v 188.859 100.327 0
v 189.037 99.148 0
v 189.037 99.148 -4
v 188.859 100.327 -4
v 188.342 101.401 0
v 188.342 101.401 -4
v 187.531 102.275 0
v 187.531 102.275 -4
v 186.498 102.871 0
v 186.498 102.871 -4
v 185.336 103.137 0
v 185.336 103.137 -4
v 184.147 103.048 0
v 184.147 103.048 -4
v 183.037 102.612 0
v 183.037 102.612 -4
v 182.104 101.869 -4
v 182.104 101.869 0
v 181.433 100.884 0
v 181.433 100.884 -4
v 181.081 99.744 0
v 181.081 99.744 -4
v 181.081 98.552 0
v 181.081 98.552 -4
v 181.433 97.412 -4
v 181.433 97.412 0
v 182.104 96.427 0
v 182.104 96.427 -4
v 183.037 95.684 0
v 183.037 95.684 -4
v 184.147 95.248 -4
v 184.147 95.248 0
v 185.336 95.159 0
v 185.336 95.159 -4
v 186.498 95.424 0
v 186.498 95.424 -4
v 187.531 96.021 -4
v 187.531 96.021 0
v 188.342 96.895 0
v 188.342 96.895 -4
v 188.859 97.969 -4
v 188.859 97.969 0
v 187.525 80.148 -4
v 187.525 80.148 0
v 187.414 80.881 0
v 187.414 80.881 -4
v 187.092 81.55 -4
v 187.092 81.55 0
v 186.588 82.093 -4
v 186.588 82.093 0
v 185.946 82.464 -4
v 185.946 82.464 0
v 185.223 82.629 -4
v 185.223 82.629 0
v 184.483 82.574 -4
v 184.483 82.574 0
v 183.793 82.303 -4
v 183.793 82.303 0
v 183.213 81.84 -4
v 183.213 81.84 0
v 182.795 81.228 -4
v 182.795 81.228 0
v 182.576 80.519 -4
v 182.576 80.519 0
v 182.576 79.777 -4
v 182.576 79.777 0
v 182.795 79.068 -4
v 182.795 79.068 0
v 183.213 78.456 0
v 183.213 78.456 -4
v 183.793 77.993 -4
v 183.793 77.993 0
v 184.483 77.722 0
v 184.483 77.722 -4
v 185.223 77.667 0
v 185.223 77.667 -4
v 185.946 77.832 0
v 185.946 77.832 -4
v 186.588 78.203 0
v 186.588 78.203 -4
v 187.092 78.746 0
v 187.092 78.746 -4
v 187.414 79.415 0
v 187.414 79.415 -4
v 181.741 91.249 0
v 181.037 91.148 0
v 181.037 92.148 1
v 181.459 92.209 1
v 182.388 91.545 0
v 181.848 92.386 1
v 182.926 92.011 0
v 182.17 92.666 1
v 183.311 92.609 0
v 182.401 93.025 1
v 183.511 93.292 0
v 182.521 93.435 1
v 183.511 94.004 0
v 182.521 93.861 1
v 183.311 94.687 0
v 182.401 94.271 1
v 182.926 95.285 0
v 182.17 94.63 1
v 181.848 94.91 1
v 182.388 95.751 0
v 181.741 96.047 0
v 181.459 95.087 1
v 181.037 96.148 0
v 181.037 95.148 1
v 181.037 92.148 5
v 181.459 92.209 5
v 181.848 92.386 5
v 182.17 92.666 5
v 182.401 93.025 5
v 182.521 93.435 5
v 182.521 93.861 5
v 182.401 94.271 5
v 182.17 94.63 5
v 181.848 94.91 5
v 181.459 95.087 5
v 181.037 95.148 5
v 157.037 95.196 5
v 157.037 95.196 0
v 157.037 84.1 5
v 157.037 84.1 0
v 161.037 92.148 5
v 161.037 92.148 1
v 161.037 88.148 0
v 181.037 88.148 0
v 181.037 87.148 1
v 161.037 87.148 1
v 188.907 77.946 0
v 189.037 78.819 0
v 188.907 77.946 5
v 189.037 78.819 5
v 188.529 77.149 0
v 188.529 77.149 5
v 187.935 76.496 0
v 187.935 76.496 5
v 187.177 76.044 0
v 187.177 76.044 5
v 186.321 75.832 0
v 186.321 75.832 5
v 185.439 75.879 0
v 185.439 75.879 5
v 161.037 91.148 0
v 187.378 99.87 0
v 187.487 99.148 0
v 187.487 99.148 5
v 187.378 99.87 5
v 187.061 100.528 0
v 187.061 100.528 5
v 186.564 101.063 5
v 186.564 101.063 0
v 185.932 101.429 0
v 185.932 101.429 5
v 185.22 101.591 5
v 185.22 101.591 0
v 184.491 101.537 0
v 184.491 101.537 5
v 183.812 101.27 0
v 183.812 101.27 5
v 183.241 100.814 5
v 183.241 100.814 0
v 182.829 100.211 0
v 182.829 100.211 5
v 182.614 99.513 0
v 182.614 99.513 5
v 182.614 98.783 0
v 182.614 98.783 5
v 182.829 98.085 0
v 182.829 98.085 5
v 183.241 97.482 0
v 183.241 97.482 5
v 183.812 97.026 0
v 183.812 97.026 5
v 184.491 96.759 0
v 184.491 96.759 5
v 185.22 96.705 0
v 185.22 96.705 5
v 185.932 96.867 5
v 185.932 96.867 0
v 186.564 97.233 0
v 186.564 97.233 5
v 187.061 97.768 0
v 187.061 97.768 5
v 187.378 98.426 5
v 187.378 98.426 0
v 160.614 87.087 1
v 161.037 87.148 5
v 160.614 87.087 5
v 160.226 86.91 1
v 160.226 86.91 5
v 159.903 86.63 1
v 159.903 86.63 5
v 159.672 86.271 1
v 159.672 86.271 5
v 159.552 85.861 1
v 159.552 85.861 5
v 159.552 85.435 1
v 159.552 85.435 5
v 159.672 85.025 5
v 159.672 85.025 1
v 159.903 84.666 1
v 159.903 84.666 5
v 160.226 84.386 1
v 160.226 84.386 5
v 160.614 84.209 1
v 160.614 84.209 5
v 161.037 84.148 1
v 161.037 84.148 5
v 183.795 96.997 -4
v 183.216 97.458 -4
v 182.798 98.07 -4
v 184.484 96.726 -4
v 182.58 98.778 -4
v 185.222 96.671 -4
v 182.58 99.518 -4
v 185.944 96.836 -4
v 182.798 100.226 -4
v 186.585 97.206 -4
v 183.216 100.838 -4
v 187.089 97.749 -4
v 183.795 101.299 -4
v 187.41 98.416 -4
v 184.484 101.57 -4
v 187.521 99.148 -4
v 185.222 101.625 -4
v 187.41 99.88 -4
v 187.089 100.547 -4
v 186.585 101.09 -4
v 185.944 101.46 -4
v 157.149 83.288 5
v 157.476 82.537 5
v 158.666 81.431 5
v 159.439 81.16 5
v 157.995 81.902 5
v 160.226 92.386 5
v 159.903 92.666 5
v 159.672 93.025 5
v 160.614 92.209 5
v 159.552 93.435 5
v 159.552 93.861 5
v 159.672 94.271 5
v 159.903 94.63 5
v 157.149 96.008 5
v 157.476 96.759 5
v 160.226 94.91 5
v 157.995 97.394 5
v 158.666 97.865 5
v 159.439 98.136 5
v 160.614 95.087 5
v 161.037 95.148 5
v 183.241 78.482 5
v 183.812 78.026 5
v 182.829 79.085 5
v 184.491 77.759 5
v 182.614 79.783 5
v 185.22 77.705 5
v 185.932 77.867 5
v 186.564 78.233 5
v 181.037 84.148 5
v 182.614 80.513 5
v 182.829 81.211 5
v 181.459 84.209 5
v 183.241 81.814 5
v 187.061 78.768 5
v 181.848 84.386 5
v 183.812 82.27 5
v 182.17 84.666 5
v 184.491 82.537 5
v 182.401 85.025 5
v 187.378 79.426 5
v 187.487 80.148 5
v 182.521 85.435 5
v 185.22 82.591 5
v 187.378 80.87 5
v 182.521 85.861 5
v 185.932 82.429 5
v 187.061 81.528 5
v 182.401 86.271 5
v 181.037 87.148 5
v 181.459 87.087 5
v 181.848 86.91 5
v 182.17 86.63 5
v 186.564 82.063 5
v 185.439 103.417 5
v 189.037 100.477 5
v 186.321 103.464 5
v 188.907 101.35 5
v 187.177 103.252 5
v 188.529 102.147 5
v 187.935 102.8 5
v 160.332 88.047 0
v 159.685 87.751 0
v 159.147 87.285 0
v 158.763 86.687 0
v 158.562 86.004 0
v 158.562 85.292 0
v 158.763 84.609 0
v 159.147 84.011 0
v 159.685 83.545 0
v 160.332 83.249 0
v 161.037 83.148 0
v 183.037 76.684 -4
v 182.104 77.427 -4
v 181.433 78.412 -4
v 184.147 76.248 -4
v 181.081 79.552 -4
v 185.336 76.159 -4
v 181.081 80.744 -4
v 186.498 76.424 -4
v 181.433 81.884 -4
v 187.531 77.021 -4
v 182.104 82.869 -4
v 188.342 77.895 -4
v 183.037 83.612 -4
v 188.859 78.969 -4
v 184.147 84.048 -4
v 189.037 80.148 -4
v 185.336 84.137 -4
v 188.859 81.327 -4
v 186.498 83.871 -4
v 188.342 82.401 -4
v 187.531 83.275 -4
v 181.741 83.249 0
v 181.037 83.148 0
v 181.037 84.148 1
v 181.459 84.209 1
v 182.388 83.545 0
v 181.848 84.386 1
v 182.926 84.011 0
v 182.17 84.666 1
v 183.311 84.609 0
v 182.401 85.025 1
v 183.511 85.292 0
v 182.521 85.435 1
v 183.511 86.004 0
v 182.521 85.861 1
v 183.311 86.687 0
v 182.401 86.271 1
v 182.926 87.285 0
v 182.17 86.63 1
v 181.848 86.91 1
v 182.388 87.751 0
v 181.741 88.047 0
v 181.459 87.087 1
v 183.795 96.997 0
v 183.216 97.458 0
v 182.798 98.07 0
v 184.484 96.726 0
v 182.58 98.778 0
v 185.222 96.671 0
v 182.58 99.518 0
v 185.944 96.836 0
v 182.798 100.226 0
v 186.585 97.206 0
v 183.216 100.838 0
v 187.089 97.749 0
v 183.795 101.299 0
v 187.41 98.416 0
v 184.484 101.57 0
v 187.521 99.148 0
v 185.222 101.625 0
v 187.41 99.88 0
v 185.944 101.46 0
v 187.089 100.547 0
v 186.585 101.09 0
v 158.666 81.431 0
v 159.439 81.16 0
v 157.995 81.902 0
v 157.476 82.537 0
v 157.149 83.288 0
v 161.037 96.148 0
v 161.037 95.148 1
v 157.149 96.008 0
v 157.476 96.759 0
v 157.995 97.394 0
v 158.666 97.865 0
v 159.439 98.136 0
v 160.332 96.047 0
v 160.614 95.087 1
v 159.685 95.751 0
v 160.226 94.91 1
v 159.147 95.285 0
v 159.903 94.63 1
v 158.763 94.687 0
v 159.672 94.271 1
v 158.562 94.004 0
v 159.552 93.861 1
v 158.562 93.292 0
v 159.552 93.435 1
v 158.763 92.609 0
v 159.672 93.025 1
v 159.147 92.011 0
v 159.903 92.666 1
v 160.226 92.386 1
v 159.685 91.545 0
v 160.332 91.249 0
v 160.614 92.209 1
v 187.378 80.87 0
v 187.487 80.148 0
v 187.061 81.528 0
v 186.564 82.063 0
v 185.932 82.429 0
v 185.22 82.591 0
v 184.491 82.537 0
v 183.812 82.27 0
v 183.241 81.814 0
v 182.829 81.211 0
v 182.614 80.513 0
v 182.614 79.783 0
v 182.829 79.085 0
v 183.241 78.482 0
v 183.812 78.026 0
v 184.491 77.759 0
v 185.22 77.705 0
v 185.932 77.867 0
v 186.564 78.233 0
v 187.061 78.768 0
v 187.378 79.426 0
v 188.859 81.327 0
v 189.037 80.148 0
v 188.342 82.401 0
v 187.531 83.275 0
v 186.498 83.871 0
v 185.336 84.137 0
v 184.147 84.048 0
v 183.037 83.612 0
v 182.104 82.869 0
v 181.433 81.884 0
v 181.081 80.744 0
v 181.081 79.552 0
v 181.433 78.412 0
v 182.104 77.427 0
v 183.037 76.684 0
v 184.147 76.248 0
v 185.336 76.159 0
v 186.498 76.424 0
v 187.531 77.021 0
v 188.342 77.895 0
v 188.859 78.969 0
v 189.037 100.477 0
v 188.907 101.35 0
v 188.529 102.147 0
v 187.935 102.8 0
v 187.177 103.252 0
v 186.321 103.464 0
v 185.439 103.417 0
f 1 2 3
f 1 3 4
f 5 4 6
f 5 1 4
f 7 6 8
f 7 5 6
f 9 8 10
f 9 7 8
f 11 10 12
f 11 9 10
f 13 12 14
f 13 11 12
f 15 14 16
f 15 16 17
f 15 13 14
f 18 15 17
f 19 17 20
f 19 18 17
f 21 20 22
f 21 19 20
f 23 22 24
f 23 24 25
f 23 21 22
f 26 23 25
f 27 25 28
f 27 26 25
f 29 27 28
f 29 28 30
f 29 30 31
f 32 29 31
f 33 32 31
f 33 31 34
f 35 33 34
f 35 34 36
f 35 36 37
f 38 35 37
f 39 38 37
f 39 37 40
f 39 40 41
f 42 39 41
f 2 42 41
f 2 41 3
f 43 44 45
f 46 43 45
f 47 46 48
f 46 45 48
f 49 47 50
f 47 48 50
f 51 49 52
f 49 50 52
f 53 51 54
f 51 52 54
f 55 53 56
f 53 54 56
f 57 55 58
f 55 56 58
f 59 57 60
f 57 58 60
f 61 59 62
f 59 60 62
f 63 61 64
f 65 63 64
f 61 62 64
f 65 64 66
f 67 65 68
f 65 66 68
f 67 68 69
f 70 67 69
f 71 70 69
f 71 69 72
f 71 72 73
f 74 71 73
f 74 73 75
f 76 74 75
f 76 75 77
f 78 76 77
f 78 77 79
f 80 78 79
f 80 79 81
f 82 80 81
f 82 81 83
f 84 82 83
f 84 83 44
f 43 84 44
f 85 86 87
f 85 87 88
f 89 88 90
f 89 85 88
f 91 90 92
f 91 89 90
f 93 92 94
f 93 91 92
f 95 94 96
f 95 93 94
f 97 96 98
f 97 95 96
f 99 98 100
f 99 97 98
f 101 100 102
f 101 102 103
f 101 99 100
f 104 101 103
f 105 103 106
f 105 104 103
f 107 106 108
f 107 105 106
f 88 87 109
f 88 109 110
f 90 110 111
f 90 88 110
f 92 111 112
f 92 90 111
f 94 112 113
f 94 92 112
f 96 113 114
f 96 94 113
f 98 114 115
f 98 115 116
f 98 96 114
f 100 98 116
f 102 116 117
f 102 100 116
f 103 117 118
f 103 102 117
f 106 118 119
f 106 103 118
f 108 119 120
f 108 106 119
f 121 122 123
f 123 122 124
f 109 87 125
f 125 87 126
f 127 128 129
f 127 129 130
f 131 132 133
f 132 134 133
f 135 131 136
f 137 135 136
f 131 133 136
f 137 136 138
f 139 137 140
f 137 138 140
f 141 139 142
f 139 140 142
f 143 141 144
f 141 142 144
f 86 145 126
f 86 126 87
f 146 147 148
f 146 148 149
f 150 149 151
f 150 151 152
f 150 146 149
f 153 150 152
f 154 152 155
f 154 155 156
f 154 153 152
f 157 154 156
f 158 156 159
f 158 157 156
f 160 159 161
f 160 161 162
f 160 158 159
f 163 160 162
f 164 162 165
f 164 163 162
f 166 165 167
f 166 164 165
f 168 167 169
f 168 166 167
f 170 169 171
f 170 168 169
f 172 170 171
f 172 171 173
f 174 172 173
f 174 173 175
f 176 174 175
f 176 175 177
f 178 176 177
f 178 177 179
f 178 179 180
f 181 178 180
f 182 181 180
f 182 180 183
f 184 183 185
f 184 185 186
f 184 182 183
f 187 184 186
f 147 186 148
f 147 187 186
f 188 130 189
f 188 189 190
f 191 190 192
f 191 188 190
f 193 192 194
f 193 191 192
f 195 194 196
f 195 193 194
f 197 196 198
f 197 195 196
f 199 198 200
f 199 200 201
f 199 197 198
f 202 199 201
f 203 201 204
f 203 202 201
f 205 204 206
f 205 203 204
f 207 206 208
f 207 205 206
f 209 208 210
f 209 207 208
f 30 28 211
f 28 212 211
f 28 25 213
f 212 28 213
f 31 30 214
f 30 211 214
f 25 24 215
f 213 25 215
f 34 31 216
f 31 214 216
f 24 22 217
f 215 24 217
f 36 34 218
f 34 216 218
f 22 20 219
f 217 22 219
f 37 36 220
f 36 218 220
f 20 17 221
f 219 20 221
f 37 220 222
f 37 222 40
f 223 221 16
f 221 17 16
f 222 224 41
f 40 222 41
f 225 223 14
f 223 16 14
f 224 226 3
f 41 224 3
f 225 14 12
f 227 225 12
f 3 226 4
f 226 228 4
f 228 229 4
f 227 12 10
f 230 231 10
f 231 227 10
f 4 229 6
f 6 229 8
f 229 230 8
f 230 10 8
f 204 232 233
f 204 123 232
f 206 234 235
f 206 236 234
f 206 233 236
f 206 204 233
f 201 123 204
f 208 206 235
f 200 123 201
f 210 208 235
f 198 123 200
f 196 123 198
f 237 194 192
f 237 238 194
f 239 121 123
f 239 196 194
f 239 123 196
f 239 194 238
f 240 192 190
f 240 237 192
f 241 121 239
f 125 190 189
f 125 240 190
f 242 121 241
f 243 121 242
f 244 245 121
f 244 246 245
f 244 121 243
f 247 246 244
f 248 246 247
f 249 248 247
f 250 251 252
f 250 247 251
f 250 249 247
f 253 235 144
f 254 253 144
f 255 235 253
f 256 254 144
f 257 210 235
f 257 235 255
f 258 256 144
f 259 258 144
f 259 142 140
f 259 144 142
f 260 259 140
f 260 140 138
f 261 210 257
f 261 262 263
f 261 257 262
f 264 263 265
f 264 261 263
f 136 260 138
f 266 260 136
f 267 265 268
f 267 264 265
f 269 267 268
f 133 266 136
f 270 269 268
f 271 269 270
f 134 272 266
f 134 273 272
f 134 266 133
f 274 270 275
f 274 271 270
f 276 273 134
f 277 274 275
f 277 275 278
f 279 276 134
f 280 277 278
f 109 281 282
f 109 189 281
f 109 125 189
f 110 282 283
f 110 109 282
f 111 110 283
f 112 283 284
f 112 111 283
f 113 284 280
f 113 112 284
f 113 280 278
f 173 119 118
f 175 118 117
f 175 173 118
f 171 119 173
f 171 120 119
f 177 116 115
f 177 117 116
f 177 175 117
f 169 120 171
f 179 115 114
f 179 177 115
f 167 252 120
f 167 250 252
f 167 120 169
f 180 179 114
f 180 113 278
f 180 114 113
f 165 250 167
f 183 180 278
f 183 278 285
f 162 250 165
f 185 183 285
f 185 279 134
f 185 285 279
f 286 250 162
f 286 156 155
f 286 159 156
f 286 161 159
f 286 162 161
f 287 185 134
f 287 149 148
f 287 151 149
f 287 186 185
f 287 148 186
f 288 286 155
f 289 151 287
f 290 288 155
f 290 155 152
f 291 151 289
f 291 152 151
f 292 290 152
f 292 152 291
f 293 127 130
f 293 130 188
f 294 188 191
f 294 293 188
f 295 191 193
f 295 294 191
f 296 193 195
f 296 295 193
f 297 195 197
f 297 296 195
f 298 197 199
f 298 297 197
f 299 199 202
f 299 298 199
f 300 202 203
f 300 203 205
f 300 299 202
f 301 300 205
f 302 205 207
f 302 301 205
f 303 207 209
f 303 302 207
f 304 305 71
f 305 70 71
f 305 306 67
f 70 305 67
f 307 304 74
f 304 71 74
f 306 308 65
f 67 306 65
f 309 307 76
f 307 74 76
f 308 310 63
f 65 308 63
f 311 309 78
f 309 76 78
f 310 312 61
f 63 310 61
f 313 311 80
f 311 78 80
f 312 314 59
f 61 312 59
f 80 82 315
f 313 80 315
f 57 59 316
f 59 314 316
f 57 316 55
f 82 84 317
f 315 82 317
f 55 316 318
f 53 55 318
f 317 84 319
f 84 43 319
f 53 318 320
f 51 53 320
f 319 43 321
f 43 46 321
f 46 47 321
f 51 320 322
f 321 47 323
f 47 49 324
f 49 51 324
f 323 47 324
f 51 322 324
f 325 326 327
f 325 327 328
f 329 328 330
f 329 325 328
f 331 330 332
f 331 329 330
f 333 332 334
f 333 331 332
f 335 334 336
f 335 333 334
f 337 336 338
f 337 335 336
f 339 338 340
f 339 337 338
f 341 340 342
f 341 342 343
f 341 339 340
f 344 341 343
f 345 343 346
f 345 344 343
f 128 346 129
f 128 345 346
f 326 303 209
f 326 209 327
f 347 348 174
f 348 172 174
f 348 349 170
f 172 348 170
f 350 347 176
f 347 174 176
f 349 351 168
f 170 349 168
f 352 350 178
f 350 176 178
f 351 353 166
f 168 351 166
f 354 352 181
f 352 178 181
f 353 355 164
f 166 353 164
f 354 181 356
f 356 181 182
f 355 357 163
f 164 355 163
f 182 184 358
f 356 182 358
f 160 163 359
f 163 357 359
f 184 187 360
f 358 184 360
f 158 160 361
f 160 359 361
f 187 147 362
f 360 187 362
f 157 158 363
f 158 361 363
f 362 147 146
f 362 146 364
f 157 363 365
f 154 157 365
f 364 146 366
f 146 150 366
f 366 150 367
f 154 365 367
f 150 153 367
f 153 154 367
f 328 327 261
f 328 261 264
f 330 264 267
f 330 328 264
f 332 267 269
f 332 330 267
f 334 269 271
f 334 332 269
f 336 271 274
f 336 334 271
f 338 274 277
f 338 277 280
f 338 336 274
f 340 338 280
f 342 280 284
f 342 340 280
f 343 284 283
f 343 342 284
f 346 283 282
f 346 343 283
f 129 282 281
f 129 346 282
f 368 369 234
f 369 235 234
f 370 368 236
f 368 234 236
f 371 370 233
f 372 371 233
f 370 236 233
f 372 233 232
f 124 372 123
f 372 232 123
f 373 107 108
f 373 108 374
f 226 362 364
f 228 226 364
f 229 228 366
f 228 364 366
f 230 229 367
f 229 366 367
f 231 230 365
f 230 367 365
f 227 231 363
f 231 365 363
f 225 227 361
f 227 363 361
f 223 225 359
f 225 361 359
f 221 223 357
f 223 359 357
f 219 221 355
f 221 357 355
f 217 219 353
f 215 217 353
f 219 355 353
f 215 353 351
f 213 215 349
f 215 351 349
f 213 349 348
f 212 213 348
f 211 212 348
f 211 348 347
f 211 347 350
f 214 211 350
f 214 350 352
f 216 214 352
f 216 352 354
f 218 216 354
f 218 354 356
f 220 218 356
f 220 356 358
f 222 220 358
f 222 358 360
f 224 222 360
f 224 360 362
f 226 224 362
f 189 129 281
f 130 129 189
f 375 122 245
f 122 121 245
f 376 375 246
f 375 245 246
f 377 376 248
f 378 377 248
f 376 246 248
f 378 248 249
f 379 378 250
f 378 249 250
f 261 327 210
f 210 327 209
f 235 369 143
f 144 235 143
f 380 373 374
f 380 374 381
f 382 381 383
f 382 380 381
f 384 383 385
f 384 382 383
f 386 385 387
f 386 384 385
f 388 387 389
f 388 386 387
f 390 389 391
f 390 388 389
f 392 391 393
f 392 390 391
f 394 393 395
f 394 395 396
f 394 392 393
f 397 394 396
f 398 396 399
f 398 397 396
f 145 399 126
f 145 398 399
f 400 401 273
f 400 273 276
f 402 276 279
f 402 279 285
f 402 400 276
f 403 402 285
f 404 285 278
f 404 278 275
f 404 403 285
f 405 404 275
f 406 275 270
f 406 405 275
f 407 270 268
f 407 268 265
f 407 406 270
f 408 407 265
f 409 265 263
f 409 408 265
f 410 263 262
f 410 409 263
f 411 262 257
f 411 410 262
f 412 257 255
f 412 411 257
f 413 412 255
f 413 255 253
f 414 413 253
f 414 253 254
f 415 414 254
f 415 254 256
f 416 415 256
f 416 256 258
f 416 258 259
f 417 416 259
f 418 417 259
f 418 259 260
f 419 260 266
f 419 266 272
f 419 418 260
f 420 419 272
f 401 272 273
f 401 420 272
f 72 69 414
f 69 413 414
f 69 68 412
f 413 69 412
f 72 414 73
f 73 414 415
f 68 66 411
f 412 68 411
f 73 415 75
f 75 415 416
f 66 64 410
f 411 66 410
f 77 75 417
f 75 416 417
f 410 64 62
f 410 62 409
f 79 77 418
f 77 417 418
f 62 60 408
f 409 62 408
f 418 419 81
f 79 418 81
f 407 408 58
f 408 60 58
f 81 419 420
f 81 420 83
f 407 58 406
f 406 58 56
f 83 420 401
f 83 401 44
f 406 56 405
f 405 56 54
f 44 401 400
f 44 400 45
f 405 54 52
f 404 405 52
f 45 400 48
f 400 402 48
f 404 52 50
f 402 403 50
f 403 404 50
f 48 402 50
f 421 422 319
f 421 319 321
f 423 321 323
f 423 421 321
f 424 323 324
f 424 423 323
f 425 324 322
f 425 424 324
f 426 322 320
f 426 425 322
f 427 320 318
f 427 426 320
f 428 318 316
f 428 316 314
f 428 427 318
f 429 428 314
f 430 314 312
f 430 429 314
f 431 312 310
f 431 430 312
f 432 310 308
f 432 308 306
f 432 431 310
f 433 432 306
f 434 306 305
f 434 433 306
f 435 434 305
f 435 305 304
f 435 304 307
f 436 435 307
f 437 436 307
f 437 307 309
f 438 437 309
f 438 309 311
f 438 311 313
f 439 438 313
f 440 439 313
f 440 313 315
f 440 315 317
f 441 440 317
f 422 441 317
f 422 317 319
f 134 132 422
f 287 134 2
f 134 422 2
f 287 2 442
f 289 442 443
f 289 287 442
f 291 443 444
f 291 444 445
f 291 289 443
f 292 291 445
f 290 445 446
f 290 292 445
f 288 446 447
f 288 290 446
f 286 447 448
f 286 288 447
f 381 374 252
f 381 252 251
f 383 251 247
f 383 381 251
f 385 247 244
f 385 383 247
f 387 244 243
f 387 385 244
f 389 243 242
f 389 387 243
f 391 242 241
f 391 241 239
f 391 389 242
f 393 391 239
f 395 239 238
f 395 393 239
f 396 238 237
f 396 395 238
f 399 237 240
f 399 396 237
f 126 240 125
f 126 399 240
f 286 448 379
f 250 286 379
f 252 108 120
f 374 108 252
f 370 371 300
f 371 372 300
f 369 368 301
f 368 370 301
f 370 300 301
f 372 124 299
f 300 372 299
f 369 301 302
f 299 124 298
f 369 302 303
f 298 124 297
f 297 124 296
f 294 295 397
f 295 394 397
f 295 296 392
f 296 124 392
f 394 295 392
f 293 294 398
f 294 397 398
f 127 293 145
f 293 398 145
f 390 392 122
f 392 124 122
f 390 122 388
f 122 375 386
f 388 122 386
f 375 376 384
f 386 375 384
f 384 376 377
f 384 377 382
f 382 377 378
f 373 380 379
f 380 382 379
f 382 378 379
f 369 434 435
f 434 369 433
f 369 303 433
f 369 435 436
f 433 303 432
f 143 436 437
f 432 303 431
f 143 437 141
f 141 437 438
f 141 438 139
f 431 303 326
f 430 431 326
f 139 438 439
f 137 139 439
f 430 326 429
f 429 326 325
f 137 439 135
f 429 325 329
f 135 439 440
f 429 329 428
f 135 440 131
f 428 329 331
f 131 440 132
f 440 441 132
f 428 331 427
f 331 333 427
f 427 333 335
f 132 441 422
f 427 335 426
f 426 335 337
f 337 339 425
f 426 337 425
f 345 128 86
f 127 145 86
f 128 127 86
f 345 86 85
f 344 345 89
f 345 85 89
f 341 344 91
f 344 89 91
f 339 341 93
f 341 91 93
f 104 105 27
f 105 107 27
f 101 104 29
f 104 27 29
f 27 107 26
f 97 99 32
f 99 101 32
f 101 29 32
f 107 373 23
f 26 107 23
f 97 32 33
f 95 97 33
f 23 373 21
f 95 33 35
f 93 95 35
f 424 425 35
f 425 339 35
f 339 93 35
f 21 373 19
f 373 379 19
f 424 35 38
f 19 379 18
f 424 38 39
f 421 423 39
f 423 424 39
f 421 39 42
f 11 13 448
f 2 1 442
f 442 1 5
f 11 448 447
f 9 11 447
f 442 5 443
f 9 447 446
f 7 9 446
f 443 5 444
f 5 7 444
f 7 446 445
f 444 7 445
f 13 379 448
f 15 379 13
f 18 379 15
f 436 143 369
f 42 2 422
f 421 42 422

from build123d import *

# Parameters (mm, degrees)
SKETCH_R      = 2.45
PAD_DEPTH     = 5
SKETCH001_R   = 4
SKETCH001_R_2 = 2.484206
SKETCH001_R_3 = 2.488042
PAD001_DEPTH  = 9
FILLET_R      = 3
CHAMFER_SIZE  = 1


with BuildPart() as part:
    # Sketch → Pad (new body)
    with BuildSketch(Plane.XY):
        Polygon((189.036612, 104.147994), (157.036612, 97.647994), (157.036612, 81.647994), (189.036612, 75.147994), align=None)
        with Locations((185.036612, 80.147994)):
            Circle(SKETCH_R, mode=Mode.SUBTRACT)
        with Locations((185.036612, 99.147994)):
            Circle(SKETCH_R, mode=Mode.SUBTRACT)
        with BuildLine():
            ThreePointArc((181.036612, 92.147994), (182.536612, 93.647994), (181.036612, 95.147994))
            Line((181.036612, 95.147994), (161.036612, 95.147994))
            ThreePointArc((161.036612, 95.147994), (159.536612, 93.647994), (161.036612, 92.147994))
            Line((181.036612, 92.147994), (161.036612, 92.147994))
        make_face(mode=Mode.SUBTRACT)
        with BuildLine():
            ThreePointArc((181.036612, 84.147994), (182.536612, 85.647994), (181.036612, 87.147994))
            Line((181.036612, 87.147994), (161.036612, 87.147994))
            ThreePointArc((161.036612, 87.147994), (159.536612, 85.647994), (161.036612, 84.147994))
            Line((181.036612, 84.147994), (161.036612, 84.147994))
        make_face(mode=Mode.SUBTRACT)
    extrude(amount=PAD_DEPTH)

    # Sketch001 → Pad001 (join)
    with BuildSketch(Plane.XY.offset(5)):
        with Locations((185.036612, 99.147994)):
            Circle(SKETCH001_R)
        with Locations((185.036612, 99.147994)):
            Circle(SKETCH001_R_2, mode=Mode.SUBTRACT)
        with Locations((185.036612, 80.147994)):
            Circle(SKETCH001_R)
        with Locations((185.036612, 80.147994)):
            Circle(SKETCH001_R_3, mode=Mode.SUBTRACT)
    extrude(amount=-PAD001_DEPTH)

    # Fillet
    fillet_edges = [part.edges().sort_by_distance(p)[0] for p in [
        (189.036612, 104.147994, 2.5),
        (189.036612, 75.147994, 2.5),
        (157.036612, 97.647994, 2.5),
        (157.036612, 81.647994, 2.5),
    ]]
    fillet(fillet_edges, radius=FILLET_R)

    # Chamfer
    chamfer_edges = [part.edges().sort_by_distance(p)[0] for p in [
        (171.036612, 95.147994, 0),
        (171.036612, 92.147994, 0),
        (171.036612, 87.147994, 0),
        (171.036612, 84.147994, 0),
    ]]
    chamfer(chamfer_edges, length=CHAMFER_SIZE)


solid = part.part
